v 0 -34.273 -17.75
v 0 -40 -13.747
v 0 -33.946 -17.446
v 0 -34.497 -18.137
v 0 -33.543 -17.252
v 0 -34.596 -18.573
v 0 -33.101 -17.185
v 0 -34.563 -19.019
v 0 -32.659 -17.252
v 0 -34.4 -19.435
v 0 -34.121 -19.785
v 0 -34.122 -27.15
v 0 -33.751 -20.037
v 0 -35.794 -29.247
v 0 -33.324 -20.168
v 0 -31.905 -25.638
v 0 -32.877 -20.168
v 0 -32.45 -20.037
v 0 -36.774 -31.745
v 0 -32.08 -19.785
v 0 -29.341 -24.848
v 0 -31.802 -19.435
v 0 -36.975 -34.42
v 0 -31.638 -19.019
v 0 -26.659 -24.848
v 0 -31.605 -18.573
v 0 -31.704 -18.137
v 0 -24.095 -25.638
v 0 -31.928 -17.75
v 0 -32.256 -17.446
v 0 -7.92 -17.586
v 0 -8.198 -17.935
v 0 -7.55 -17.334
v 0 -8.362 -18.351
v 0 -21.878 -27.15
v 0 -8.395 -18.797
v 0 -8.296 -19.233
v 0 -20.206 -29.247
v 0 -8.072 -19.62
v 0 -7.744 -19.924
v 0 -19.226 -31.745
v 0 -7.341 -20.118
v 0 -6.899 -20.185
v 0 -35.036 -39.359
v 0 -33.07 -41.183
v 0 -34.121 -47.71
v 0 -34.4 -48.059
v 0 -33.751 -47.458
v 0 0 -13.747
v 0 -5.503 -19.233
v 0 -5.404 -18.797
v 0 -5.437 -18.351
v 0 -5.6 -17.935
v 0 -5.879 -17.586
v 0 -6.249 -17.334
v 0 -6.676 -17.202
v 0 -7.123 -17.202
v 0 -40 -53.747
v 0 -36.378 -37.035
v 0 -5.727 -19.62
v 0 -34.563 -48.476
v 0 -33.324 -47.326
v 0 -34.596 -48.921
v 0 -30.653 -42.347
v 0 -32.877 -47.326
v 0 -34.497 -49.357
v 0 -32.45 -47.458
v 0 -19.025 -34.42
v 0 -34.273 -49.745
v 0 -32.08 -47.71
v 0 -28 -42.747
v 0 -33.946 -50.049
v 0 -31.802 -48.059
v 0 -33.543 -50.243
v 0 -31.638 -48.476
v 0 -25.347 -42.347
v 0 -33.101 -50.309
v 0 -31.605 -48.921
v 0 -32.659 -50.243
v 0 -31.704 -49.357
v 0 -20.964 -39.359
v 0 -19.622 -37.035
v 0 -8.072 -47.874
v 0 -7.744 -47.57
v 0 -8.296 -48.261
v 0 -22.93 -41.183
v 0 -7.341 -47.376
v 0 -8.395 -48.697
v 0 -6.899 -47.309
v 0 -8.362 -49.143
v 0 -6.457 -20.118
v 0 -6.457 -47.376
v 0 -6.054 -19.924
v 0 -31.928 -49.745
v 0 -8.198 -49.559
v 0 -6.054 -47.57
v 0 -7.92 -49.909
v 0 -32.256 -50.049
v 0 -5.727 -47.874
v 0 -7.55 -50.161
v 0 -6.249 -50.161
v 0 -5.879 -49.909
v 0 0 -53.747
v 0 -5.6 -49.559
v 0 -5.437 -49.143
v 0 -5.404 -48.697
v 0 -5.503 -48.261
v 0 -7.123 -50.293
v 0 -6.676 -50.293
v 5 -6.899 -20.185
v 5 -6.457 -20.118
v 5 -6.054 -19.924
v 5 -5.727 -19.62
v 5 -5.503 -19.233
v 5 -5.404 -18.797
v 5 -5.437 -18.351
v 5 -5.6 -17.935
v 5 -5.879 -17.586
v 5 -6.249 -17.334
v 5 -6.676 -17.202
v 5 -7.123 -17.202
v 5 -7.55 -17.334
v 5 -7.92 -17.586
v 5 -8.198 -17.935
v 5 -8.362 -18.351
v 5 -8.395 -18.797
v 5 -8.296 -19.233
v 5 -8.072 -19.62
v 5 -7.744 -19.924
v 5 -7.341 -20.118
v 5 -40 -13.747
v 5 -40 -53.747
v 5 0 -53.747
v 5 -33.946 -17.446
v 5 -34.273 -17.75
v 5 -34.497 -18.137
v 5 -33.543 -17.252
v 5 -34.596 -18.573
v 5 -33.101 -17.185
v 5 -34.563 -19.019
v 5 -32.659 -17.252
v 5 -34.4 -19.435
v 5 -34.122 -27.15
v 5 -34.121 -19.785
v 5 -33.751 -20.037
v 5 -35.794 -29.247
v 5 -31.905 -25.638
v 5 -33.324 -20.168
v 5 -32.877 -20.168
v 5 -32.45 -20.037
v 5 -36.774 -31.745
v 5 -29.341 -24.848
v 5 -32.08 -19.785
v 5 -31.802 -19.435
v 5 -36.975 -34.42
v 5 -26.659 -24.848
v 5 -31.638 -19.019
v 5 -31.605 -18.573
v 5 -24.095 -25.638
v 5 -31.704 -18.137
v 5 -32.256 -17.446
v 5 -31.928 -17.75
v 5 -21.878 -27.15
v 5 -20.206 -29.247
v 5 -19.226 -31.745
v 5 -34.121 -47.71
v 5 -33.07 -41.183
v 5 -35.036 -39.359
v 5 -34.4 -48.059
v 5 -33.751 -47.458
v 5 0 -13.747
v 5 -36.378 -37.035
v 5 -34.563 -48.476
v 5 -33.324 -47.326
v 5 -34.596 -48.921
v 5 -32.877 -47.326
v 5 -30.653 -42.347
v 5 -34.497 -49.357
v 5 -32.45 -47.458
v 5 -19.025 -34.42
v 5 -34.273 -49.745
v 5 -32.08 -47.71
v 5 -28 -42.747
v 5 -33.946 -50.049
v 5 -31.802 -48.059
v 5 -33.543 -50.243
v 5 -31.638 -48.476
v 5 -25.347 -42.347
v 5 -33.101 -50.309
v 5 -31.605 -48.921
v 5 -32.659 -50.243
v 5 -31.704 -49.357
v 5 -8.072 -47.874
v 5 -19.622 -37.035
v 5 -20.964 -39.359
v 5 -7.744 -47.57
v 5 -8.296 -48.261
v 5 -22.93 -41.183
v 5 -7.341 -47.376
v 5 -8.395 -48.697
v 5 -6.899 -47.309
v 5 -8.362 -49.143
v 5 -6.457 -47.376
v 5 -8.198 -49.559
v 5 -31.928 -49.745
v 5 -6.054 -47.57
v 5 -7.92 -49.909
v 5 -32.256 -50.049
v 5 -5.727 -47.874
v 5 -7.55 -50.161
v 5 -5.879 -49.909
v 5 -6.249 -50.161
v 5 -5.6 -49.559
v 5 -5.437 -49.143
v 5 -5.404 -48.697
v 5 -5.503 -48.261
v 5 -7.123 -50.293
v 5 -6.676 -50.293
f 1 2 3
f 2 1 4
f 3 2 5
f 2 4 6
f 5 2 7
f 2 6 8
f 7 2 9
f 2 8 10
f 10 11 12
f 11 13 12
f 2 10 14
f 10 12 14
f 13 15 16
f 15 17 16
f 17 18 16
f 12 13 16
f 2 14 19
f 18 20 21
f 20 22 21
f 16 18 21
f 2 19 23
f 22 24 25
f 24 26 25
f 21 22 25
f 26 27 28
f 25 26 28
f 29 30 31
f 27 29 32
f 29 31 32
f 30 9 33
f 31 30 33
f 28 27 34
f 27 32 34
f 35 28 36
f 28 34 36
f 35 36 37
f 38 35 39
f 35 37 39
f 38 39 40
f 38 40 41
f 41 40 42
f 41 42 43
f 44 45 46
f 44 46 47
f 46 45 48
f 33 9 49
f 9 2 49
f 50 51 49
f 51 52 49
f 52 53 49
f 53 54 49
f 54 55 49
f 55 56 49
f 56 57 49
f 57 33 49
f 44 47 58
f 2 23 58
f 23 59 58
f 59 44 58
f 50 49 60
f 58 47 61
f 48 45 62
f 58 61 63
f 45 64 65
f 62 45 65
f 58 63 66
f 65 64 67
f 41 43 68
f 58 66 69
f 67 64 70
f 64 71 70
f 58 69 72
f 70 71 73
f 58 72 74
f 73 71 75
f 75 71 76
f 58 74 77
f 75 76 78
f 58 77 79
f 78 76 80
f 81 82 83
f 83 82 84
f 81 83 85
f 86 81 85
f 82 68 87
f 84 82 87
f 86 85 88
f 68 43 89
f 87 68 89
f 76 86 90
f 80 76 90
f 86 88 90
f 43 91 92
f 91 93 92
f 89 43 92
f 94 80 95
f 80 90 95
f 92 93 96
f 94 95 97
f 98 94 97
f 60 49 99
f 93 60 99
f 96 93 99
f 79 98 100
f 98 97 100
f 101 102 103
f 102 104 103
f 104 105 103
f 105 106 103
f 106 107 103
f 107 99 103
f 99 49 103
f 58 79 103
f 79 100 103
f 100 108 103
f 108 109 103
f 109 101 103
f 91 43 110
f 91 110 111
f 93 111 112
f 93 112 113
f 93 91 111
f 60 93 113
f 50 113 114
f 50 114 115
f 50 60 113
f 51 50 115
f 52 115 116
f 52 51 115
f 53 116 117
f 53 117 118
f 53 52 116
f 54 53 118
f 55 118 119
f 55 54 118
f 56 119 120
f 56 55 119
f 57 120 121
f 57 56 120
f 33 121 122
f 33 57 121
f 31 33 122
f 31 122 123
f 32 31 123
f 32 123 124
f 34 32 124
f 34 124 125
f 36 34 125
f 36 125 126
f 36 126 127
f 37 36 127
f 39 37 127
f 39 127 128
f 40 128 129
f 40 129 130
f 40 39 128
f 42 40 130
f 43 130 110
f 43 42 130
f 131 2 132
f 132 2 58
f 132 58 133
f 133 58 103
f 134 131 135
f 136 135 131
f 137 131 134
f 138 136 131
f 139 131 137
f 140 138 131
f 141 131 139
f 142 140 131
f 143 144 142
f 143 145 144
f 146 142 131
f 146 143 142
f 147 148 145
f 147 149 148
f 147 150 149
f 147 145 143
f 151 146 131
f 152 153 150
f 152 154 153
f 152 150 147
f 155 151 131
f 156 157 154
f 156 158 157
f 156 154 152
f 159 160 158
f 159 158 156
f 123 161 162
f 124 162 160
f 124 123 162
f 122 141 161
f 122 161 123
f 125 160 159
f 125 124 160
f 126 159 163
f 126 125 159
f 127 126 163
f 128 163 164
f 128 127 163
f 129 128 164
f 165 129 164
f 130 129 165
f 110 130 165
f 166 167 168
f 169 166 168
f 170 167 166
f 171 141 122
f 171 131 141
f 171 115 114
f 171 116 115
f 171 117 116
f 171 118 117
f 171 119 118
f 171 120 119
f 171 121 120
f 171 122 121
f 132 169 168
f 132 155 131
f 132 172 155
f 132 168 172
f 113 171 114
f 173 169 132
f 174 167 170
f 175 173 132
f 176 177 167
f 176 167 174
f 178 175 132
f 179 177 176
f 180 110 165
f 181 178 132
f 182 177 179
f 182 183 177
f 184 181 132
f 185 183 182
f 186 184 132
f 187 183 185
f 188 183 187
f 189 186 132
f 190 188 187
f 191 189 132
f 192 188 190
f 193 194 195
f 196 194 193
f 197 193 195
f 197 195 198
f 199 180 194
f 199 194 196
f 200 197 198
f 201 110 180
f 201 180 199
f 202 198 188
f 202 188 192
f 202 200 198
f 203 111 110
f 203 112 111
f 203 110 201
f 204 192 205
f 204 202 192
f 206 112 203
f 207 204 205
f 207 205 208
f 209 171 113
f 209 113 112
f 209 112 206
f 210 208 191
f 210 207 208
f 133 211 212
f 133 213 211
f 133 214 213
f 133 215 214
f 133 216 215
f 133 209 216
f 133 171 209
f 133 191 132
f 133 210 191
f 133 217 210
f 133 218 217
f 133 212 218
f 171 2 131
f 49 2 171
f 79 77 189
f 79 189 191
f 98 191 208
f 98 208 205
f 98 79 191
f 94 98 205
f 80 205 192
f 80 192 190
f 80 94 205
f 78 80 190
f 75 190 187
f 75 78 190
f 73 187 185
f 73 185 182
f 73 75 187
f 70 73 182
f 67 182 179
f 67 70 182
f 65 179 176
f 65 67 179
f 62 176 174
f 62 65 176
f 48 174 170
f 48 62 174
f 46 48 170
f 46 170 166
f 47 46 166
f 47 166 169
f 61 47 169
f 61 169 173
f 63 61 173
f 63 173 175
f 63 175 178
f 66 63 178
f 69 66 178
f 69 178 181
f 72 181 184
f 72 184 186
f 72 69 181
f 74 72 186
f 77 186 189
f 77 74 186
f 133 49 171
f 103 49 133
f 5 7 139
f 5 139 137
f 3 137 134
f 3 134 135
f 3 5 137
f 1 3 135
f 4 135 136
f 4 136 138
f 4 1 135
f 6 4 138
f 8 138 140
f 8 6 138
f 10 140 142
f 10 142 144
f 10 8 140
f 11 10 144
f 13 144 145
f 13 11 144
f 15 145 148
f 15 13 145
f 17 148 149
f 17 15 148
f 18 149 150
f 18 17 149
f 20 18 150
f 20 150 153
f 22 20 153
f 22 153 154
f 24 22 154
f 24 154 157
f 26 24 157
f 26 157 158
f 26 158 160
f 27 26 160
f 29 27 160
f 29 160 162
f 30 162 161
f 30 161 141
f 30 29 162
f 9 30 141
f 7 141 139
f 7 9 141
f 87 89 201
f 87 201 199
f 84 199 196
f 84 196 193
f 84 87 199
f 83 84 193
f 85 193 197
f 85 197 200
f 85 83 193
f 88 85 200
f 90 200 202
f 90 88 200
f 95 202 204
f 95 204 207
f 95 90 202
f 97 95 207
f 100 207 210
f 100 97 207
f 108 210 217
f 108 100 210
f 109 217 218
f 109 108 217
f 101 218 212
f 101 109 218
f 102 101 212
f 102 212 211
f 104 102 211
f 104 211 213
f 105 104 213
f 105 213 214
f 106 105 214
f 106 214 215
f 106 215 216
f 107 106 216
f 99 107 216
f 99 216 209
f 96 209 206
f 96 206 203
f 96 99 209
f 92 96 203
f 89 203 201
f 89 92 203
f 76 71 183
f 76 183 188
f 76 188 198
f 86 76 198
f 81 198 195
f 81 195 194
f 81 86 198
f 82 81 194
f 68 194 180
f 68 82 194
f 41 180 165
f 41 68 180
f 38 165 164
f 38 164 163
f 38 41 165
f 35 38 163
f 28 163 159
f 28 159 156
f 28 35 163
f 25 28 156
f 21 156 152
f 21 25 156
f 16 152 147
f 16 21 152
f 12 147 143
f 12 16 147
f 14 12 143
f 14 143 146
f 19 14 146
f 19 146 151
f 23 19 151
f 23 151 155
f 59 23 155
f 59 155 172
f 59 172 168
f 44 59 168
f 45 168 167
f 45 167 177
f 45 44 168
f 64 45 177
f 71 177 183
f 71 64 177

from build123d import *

# Parameters (mm, degrees)
SKETCH1_W           = 40
SKETCH1_H           = 40
SKETCH1_R           = 9
SKETCH1_R_2         = 1.5
BOSS_EXTRUDE1_DEPTH = 5


with BuildPart() as part:
    # Sketch1 → Boss-Extrude1 (new body)
    with BuildSketch(Plane(origin=(0, 0, 0), x_dir=(0, 0, -1), z_dir=(1, 0, 0))):
        with Locations((33.747195152, -20)):
            Rectangle(SKETCH1_W, SKETCH1_H)
        with Locations((33.747195152, -28)):
            Circle(SKETCH1_R, mode=Mode.SUBTRACT)
        with Locations((18.685090131, -6.89933539)):
            Circle(SKETCH1_R_2, mode=Mode.SUBTRACT)
        with Locations(Location((18.685090131, -33.10066461, 0), (0, 0, 180))):
            Circle(SKETCH1_R_2, mode=Mode.SUBTRACT)
        with Locations((48.809300173, -33.10066461)):
            Circle(SKETCH1_R_2, mode=Mode.SUBTRACT)
        with Locations(Location((48.809300173, -6.89933539, 0), (0, 0, 180))):
            Circle(SKETCH1_R_2, mode=Mode.SUBTRACT)
    extrude(amount=BOSS_EXTRUDE1_DEPTH)


solid = part.part
